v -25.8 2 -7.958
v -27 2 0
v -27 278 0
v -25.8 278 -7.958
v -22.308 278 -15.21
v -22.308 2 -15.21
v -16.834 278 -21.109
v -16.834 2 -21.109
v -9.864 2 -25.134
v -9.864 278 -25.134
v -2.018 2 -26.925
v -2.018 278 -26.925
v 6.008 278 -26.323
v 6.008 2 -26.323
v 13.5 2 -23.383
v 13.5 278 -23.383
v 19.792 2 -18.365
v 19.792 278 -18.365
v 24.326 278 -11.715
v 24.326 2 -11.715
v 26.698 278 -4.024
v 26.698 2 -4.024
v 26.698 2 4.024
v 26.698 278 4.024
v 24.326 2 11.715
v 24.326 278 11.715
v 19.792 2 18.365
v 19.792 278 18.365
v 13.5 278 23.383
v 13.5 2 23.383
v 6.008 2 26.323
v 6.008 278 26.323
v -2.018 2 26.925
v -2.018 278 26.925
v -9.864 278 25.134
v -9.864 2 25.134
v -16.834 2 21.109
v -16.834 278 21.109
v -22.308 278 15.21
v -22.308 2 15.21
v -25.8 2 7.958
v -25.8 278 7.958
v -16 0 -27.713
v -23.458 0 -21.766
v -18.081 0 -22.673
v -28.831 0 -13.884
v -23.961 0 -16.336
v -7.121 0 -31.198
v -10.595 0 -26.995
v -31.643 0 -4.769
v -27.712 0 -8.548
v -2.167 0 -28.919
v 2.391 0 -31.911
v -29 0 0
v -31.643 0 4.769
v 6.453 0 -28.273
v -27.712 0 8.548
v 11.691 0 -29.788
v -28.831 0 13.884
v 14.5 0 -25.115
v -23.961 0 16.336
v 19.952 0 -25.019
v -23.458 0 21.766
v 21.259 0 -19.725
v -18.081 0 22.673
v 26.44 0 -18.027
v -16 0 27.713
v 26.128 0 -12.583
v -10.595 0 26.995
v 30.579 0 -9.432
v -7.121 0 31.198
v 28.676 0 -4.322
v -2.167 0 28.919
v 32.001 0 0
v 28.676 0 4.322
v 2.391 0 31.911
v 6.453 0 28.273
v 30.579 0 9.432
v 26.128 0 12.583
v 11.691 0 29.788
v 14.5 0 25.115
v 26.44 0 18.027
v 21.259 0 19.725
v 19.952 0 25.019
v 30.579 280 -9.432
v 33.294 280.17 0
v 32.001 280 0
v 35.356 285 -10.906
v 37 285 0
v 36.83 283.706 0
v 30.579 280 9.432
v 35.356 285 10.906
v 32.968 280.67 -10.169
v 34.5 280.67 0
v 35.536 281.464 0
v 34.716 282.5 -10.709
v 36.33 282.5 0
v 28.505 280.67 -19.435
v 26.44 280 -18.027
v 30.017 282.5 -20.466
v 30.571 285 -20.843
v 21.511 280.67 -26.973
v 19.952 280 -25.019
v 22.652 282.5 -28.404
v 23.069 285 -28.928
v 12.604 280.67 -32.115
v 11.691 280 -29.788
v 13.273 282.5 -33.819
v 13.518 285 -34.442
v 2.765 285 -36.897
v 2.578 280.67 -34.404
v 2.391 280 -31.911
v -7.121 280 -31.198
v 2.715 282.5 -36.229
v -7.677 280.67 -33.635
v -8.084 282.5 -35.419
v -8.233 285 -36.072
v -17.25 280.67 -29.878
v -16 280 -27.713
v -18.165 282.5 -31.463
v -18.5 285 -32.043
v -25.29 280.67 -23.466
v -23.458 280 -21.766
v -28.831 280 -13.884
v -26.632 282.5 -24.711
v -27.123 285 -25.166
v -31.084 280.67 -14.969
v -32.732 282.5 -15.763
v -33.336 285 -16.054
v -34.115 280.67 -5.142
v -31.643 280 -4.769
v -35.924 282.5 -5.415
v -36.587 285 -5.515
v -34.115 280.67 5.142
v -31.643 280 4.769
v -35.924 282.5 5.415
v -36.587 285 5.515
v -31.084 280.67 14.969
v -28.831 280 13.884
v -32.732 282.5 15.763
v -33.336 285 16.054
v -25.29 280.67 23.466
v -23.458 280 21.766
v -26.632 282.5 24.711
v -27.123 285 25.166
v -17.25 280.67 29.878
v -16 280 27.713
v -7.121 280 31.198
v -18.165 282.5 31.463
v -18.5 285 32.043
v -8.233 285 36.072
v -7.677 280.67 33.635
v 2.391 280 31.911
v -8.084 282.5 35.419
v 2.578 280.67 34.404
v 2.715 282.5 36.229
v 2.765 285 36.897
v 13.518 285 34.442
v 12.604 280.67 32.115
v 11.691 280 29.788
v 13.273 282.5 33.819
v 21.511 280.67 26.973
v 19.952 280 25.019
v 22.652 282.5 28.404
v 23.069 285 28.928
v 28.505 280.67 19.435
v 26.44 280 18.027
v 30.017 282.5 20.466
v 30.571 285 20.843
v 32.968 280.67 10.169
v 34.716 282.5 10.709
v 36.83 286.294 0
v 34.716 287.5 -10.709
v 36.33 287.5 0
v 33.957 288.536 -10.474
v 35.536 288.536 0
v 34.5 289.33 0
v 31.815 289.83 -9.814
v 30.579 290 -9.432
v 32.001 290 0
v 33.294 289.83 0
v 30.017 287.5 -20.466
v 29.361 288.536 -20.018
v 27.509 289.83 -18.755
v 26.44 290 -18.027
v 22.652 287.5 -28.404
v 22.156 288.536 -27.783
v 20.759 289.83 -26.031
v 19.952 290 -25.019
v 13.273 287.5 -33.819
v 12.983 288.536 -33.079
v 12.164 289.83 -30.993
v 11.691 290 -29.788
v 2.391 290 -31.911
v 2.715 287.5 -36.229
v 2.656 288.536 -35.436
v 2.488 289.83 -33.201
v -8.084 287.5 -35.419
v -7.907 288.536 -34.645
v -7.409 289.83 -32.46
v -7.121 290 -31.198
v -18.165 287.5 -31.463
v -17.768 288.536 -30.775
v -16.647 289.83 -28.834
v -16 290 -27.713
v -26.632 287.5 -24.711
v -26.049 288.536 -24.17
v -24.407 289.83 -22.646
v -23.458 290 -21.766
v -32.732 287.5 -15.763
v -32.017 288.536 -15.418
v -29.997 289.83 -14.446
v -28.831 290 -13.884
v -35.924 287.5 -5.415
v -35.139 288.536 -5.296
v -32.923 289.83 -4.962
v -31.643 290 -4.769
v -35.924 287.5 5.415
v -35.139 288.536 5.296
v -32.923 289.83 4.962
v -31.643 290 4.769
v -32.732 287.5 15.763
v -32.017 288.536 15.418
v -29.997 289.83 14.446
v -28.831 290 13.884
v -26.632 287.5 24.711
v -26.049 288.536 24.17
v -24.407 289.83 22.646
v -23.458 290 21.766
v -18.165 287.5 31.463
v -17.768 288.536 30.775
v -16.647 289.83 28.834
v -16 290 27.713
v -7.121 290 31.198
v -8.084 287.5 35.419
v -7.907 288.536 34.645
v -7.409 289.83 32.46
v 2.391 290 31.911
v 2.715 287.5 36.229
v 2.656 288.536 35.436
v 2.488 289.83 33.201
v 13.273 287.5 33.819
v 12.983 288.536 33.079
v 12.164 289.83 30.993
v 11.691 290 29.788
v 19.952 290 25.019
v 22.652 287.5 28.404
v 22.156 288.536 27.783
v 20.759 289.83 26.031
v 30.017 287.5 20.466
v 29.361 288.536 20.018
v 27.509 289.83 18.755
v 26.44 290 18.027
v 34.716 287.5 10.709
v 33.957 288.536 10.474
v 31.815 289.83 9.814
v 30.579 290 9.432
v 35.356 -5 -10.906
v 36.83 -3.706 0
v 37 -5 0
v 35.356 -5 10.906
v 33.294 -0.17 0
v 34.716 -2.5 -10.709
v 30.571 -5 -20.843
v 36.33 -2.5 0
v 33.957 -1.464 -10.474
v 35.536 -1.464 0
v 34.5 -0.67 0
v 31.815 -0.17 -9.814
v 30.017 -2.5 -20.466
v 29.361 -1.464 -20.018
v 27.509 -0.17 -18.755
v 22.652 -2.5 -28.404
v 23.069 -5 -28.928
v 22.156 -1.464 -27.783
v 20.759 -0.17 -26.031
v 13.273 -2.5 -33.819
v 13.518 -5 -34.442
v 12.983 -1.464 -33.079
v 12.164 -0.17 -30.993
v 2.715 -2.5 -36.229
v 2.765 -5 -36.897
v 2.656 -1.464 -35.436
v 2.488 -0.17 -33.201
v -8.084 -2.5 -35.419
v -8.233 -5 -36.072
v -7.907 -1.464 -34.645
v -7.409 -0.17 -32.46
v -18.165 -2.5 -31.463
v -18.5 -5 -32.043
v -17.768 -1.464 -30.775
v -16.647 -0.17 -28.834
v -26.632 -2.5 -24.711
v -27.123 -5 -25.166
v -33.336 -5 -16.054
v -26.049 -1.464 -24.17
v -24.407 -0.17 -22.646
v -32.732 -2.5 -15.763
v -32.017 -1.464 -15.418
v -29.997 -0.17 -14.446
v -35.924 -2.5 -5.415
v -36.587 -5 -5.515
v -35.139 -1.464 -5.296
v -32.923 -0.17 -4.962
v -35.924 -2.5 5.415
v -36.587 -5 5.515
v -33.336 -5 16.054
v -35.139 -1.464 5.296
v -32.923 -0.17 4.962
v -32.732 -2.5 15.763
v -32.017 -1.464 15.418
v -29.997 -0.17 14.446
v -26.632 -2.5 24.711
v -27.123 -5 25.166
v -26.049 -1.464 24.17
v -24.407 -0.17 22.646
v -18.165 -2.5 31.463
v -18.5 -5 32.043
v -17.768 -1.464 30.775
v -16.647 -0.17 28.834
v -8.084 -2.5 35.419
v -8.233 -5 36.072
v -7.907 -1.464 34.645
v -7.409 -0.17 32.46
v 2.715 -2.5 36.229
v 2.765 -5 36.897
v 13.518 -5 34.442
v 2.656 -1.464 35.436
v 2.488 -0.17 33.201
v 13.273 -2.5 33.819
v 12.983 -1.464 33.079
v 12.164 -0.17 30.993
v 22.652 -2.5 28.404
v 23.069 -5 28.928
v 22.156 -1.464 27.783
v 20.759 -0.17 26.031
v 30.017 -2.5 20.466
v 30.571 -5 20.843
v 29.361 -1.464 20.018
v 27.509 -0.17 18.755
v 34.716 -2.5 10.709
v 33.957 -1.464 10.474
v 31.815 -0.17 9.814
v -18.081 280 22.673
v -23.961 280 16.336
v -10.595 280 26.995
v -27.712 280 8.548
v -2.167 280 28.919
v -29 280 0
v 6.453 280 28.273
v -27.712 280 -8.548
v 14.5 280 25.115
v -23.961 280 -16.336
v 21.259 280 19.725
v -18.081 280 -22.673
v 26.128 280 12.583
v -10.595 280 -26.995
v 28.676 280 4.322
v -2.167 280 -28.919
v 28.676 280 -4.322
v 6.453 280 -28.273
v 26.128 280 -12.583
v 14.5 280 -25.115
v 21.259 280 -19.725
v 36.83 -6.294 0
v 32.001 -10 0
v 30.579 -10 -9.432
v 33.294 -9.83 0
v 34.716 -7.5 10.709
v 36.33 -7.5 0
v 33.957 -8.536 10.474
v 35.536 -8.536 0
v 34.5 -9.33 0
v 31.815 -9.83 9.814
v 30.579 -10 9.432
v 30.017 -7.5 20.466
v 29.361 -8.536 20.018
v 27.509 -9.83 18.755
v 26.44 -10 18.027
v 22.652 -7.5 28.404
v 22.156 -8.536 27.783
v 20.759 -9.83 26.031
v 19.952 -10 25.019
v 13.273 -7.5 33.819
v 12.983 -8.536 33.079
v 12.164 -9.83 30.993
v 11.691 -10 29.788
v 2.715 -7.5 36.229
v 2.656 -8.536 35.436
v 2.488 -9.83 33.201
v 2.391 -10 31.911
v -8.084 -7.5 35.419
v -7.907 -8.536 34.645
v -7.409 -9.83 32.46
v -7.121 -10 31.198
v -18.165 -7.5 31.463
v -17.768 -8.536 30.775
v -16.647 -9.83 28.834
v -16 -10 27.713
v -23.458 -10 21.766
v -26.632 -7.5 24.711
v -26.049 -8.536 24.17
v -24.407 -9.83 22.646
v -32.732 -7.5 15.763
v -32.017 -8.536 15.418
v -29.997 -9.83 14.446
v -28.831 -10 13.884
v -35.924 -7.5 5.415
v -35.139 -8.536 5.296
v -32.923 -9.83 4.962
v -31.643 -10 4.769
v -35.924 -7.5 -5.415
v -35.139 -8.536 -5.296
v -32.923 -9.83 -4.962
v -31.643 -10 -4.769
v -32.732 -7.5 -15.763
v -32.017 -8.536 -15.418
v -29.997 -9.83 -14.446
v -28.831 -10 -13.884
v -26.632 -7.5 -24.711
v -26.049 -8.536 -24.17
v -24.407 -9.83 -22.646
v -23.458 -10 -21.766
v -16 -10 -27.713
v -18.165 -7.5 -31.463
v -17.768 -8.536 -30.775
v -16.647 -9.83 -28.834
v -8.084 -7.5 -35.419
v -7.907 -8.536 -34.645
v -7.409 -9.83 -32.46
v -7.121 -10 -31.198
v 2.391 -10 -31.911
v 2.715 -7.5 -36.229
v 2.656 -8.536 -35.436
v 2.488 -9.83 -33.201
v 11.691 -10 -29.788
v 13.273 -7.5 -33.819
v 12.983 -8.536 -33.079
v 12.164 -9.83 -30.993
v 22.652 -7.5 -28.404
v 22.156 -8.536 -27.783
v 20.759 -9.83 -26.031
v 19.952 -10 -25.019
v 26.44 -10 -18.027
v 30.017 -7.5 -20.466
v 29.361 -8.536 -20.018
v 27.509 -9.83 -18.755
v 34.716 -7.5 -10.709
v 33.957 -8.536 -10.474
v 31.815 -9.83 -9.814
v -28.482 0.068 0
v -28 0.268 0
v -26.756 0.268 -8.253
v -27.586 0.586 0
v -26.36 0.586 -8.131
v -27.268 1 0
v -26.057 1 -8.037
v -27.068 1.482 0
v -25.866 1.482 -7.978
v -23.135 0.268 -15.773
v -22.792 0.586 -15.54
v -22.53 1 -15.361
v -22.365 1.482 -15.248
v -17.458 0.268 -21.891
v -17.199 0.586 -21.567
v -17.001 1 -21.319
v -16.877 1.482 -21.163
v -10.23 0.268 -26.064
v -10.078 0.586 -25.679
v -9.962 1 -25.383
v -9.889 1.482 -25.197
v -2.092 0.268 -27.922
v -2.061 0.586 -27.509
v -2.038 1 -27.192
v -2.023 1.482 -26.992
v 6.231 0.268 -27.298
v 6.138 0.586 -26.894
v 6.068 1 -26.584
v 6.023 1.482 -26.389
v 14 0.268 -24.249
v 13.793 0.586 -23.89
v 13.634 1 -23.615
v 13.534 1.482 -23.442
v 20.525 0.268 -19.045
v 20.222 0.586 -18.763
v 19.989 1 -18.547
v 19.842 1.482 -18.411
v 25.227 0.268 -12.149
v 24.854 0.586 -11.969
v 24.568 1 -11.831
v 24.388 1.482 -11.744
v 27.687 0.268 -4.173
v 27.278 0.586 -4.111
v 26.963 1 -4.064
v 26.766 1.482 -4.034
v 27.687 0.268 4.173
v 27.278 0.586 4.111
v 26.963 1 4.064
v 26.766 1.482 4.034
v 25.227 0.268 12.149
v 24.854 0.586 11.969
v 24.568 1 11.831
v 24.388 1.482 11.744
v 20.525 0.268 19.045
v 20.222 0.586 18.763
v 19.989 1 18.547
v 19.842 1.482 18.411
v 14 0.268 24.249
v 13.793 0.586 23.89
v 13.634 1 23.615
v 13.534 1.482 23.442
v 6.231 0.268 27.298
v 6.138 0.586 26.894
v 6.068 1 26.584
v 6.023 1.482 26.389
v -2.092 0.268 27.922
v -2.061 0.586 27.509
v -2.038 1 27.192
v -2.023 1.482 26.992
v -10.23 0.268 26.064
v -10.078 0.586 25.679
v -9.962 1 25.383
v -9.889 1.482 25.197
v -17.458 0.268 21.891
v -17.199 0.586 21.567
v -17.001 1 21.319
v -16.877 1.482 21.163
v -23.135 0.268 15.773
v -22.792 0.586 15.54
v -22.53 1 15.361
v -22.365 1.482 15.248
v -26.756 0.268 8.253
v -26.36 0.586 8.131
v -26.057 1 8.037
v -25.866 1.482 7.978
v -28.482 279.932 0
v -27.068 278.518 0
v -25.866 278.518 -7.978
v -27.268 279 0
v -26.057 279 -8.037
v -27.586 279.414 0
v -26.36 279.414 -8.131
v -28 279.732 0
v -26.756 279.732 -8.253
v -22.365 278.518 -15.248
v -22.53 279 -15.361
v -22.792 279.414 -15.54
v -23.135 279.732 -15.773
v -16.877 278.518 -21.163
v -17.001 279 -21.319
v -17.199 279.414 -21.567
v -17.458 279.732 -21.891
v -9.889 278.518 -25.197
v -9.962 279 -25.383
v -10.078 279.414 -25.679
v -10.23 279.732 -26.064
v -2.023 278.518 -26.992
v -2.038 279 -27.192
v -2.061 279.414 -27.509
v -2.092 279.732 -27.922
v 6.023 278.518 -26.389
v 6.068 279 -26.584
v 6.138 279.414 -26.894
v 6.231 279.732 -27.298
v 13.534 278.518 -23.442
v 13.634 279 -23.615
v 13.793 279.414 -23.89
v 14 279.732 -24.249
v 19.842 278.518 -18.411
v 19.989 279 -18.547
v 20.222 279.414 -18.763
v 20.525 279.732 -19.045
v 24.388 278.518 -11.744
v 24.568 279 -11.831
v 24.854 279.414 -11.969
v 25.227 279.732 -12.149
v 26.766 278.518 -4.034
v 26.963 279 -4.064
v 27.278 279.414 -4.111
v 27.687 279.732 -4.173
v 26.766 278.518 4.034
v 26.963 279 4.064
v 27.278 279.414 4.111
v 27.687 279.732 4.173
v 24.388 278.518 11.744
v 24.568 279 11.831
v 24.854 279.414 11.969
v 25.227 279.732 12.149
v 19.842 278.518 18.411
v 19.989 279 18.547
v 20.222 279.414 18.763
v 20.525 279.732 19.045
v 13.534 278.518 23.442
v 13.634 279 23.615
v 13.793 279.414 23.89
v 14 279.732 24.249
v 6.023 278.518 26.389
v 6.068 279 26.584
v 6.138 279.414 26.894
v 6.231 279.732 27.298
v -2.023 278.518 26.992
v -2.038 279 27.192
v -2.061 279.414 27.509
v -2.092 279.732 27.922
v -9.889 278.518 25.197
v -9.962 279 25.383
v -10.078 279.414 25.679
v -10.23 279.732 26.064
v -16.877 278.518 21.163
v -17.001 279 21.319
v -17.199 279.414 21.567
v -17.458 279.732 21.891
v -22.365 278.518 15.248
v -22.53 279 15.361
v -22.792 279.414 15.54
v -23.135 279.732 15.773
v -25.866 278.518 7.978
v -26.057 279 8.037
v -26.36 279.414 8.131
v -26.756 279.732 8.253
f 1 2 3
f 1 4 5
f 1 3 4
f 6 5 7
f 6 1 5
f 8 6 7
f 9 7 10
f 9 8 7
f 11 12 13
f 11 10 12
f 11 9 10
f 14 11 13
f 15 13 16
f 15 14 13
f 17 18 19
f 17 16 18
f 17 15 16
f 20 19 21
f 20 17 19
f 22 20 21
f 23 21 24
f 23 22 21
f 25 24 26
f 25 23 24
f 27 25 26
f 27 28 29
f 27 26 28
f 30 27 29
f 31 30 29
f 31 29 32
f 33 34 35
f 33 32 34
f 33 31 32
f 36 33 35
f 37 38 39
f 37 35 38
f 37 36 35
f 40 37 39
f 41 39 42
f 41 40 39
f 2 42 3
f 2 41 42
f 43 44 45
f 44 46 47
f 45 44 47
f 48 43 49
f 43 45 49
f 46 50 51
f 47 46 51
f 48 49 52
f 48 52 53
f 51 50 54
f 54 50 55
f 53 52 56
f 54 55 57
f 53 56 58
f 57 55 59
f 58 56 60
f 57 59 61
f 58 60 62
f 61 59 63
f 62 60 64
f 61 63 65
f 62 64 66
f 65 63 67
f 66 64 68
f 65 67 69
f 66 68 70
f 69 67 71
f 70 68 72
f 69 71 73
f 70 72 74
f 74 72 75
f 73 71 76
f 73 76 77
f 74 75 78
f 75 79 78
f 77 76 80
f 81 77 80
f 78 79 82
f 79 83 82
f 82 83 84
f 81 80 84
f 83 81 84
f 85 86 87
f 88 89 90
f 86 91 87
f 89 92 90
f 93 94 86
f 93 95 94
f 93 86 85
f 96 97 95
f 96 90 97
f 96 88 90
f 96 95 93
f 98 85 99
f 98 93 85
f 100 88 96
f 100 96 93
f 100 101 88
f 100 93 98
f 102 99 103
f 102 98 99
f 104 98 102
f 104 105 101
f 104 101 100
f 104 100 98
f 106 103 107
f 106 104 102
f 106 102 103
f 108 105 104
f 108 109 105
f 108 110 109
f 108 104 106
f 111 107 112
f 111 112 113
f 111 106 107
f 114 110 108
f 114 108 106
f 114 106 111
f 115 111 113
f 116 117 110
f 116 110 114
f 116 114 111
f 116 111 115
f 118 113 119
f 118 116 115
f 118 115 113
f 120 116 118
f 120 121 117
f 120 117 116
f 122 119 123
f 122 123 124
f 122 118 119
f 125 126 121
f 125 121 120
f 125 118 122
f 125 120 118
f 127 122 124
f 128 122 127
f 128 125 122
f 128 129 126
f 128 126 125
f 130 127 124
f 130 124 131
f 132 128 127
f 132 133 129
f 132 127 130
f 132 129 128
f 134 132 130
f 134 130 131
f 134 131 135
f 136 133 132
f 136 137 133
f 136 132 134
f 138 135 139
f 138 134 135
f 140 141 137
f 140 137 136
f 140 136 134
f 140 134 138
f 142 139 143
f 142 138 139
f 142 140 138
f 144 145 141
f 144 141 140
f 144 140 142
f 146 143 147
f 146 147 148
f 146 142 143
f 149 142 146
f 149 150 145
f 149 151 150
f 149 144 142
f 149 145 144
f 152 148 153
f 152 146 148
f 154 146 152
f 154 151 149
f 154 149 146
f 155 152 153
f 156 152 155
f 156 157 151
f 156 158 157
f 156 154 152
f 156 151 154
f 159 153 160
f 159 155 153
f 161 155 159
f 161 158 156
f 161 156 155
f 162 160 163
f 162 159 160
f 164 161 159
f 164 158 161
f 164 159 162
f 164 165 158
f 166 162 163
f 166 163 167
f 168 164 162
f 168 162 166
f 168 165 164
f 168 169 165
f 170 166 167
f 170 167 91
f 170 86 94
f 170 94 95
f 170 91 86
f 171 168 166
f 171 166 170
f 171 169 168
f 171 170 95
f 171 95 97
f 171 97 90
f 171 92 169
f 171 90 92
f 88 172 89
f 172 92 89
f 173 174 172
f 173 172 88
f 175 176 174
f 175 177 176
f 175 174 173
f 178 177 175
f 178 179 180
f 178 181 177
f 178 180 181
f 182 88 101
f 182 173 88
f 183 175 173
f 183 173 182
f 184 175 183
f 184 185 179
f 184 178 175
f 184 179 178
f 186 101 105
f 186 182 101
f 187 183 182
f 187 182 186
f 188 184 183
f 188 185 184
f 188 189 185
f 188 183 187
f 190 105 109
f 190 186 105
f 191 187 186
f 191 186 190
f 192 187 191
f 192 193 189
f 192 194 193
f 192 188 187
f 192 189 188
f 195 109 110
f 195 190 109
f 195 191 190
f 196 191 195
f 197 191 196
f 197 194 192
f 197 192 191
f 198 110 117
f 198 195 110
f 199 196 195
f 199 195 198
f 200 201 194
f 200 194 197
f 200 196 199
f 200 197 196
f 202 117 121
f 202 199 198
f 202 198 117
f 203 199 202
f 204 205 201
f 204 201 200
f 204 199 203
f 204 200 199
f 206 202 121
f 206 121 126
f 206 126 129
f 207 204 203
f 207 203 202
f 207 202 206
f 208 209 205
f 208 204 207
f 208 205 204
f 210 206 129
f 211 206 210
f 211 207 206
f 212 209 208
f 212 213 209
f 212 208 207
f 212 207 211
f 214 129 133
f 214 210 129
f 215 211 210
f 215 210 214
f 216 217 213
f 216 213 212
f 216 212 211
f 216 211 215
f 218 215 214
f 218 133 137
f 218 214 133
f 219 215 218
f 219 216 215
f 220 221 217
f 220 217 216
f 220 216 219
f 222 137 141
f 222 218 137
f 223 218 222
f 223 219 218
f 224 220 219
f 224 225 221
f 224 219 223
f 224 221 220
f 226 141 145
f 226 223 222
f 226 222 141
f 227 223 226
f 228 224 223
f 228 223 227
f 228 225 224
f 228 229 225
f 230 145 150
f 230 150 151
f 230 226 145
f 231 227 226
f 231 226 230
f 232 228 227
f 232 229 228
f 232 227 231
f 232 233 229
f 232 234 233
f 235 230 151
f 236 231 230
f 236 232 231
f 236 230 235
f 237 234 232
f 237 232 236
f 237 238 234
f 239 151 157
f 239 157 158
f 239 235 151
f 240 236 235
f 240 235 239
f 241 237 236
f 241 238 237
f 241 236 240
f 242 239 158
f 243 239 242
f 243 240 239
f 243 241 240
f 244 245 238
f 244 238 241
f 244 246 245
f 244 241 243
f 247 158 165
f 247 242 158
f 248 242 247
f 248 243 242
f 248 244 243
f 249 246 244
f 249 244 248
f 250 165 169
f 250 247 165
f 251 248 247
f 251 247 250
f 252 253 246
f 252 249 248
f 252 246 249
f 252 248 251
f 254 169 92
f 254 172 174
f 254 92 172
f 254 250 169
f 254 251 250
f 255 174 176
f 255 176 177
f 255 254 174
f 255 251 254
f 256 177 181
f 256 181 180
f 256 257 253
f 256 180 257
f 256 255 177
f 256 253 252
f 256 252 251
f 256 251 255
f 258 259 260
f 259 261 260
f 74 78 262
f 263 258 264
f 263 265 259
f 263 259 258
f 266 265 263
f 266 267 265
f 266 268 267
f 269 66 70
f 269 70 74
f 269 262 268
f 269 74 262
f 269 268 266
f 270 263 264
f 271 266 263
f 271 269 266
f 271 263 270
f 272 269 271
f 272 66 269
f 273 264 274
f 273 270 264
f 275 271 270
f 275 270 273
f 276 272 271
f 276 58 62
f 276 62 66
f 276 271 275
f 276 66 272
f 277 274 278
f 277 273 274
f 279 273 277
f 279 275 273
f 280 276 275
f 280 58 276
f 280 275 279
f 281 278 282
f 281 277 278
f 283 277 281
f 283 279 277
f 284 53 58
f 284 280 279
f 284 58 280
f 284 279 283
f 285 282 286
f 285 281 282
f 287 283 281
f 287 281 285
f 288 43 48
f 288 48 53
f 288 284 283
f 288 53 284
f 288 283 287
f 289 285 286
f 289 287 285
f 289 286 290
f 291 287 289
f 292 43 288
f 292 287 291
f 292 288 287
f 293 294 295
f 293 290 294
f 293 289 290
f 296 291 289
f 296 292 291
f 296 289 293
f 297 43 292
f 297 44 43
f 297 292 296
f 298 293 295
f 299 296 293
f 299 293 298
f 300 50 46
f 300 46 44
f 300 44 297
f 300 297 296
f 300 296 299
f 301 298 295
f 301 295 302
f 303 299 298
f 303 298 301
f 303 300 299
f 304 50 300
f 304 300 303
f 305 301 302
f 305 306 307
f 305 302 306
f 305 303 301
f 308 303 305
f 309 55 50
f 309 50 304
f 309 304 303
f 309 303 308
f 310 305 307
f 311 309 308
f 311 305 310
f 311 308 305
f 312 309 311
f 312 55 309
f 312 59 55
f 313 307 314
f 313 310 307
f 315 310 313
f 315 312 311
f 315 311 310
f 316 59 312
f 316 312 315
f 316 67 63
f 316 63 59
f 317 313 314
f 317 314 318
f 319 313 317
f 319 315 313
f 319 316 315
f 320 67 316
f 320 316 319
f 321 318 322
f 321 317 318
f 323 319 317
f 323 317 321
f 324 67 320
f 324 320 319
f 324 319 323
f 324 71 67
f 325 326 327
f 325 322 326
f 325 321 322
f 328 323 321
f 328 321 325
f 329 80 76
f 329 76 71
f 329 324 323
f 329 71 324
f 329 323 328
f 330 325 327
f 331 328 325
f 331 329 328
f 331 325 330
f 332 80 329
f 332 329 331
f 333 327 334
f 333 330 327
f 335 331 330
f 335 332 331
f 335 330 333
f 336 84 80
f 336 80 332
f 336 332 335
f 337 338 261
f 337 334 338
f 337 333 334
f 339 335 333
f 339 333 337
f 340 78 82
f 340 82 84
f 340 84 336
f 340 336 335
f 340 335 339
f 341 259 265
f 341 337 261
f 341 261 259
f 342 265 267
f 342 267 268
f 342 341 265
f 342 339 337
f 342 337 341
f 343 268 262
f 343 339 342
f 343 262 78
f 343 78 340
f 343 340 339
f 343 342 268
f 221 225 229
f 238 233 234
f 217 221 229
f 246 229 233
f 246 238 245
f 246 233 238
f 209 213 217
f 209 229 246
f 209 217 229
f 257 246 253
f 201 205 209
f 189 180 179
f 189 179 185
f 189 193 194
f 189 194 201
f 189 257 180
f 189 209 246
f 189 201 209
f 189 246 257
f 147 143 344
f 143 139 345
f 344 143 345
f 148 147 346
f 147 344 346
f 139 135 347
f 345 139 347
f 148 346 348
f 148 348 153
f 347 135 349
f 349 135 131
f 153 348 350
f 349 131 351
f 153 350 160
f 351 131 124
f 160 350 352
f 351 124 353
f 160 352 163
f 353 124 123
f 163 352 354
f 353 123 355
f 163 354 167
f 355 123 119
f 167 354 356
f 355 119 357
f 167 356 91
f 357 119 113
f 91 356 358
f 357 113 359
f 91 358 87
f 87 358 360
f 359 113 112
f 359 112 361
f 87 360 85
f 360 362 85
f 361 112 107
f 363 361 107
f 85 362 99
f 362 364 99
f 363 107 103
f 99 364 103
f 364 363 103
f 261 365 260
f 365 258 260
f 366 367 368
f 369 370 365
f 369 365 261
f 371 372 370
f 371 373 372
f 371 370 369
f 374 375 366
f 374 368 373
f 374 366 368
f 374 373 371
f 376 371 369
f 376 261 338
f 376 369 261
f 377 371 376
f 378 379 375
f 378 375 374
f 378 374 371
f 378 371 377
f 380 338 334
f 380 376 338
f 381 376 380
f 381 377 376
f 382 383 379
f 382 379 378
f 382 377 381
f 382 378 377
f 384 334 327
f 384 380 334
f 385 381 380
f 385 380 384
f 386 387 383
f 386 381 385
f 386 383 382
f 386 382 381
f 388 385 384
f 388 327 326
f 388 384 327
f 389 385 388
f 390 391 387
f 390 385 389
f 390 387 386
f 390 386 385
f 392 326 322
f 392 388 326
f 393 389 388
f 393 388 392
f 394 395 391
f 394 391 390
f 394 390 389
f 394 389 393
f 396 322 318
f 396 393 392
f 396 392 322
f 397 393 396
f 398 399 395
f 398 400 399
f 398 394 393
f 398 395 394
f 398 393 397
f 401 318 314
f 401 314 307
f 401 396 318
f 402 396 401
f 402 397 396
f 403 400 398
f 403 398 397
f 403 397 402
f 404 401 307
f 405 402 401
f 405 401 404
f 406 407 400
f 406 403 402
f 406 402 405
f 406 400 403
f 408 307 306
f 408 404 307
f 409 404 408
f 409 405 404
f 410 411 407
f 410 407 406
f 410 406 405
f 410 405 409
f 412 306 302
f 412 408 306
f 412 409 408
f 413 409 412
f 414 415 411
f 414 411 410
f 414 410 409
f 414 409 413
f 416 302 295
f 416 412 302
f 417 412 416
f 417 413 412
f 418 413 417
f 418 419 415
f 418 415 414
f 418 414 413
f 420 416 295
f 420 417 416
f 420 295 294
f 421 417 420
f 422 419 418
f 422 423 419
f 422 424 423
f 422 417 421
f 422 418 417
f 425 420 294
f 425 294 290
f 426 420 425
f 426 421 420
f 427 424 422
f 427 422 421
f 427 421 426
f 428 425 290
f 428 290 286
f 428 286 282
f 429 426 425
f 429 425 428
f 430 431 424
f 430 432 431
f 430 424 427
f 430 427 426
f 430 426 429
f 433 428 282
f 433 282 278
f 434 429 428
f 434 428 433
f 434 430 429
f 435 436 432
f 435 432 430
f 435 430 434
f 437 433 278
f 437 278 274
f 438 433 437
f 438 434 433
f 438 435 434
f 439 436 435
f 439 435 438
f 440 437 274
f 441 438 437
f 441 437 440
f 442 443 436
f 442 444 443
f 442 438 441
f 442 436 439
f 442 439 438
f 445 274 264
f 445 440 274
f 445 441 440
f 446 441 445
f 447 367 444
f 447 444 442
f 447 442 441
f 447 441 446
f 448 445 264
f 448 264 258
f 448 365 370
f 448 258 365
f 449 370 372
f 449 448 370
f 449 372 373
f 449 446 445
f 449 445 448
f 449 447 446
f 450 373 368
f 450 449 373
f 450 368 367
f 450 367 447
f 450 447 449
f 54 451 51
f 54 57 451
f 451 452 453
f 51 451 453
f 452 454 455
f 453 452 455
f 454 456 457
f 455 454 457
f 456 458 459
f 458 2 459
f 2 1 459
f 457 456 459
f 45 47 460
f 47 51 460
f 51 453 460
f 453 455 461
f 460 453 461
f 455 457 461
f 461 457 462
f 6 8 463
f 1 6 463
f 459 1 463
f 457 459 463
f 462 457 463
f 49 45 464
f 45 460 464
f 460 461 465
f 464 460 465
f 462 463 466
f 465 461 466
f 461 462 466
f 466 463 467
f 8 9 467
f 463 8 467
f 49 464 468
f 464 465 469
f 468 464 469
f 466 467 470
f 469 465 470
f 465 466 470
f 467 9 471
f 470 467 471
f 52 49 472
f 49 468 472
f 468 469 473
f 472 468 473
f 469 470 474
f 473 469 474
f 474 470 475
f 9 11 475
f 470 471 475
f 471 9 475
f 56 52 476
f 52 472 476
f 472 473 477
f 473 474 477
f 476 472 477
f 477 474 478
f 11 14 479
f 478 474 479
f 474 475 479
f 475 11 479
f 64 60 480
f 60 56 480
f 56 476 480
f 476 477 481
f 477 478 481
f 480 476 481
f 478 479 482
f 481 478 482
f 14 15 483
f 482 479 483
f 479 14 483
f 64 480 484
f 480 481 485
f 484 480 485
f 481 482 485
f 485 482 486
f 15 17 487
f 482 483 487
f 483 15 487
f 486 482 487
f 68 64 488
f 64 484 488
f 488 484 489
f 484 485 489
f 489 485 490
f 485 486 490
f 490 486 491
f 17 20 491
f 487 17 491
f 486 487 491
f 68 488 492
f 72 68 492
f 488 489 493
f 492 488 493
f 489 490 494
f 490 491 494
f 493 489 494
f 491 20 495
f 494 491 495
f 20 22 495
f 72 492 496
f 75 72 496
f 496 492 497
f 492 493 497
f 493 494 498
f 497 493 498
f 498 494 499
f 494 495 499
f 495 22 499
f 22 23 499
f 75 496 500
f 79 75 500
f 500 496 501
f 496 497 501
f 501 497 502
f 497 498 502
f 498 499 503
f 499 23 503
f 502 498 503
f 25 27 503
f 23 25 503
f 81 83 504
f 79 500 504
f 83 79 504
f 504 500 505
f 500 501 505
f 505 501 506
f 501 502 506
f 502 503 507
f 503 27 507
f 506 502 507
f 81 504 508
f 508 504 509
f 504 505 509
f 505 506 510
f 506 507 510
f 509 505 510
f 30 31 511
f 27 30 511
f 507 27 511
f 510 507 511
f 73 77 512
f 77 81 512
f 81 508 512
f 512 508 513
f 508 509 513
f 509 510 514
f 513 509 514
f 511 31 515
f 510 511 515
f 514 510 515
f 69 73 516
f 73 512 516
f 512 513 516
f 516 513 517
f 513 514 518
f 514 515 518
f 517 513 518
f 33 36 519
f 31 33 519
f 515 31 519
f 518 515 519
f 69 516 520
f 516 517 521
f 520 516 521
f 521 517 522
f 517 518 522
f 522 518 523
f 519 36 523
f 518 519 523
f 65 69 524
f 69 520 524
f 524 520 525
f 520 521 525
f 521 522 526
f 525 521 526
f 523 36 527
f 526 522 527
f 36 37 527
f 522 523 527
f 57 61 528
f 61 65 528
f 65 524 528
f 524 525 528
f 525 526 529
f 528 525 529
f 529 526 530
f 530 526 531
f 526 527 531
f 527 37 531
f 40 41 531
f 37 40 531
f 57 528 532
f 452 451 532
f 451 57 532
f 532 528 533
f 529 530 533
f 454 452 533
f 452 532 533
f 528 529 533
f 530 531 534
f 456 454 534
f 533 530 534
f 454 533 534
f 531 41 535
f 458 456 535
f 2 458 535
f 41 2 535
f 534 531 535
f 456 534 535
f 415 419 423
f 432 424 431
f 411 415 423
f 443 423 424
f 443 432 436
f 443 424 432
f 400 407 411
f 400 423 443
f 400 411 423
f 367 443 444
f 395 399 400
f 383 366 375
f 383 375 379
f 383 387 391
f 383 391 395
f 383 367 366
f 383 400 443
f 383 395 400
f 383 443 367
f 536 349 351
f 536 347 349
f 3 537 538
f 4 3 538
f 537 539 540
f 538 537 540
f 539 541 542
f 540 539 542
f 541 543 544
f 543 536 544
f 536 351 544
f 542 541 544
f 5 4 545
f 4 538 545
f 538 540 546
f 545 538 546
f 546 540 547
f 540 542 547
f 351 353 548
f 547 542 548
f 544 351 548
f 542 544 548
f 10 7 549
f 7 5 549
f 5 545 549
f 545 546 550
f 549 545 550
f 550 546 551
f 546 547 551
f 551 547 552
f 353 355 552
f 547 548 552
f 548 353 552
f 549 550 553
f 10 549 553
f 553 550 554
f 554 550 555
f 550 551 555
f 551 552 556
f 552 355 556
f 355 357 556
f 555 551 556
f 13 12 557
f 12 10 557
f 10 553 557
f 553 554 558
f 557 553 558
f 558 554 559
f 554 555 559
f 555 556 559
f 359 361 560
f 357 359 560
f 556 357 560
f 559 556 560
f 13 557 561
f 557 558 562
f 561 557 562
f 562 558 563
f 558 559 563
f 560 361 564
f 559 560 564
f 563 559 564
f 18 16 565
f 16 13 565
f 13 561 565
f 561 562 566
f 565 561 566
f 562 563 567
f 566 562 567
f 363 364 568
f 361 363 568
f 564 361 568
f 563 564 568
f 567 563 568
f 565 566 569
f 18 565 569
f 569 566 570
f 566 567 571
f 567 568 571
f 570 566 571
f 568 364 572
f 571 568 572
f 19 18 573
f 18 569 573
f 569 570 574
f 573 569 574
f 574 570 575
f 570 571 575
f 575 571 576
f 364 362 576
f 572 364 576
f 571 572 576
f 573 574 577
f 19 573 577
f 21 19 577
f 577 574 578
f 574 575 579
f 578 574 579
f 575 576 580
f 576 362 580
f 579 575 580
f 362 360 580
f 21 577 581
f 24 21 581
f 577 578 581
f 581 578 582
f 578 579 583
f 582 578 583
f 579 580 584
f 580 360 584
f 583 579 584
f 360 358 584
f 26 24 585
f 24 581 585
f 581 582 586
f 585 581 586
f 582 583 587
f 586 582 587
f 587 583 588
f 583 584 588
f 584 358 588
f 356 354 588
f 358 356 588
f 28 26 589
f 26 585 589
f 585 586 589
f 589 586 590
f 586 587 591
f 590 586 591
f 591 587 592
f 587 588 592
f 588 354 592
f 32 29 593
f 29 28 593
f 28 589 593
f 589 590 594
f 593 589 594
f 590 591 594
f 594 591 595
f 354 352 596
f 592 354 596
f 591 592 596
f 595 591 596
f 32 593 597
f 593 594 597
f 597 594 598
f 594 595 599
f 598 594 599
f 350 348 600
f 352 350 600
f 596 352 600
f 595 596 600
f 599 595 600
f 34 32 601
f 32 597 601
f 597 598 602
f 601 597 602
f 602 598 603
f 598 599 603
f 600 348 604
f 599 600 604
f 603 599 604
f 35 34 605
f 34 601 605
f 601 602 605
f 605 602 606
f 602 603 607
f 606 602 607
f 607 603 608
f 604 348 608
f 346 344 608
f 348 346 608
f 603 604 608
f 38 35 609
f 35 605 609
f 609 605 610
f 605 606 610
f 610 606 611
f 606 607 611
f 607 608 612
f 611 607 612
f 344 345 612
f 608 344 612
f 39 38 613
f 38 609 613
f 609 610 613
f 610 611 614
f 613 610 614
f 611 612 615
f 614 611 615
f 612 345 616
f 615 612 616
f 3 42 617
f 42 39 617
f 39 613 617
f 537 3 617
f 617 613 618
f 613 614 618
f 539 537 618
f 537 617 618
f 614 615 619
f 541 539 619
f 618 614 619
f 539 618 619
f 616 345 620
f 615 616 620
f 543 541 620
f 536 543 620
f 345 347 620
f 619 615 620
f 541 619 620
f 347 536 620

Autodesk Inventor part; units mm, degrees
ref_plane "YZ Plane" through (0, 0, 0) normal (1, 0, 0) x (0, 1, 0)
ref_plane "XZ Plane" through (0, 0, 0) normal (0, 1, 0) x (-1, 0, 0)
ref_plane "XY Plane" through (0, 0, 0) normal (0, 0, 1) x (1, 0, 0)
sketch "草图1" plane through (0, 0, 0) normal (0, 1, 0) x (-1, 0, 0)
  circle A0 centre (0, 0) radius 27
  dimension "d0" = 54
extrude "拉伸1" add sketch "草图1" along normal blind 280
sketch "草图2" plane through (0, 280, 0) normal (0, 1, 0) x (1, 0, 0)
  circle A0 centre (0, 0) radius 37
extrude "拉伸2" add sketch "草图2" along normal blind 10
sketch "草图3" plane through (0, 0, 0) normal (0, -1, 0) x (1, 0, 0)
  circle A0 centre (0, 0) radius 37
extrude "拉伸3" add sketch "草图3" along normal blind 10
fillet "圆角1" radius 5 4 edges at (-37, 290, 0) (-37, 280, 0) (-37, 0, 0) (-37, -10, 0)
fillet "圆角2" radius 2 2 edges at (27, 280, 0) (27, 0, 0)
properties part number "销钉" material "钢，高强度，低合金"
